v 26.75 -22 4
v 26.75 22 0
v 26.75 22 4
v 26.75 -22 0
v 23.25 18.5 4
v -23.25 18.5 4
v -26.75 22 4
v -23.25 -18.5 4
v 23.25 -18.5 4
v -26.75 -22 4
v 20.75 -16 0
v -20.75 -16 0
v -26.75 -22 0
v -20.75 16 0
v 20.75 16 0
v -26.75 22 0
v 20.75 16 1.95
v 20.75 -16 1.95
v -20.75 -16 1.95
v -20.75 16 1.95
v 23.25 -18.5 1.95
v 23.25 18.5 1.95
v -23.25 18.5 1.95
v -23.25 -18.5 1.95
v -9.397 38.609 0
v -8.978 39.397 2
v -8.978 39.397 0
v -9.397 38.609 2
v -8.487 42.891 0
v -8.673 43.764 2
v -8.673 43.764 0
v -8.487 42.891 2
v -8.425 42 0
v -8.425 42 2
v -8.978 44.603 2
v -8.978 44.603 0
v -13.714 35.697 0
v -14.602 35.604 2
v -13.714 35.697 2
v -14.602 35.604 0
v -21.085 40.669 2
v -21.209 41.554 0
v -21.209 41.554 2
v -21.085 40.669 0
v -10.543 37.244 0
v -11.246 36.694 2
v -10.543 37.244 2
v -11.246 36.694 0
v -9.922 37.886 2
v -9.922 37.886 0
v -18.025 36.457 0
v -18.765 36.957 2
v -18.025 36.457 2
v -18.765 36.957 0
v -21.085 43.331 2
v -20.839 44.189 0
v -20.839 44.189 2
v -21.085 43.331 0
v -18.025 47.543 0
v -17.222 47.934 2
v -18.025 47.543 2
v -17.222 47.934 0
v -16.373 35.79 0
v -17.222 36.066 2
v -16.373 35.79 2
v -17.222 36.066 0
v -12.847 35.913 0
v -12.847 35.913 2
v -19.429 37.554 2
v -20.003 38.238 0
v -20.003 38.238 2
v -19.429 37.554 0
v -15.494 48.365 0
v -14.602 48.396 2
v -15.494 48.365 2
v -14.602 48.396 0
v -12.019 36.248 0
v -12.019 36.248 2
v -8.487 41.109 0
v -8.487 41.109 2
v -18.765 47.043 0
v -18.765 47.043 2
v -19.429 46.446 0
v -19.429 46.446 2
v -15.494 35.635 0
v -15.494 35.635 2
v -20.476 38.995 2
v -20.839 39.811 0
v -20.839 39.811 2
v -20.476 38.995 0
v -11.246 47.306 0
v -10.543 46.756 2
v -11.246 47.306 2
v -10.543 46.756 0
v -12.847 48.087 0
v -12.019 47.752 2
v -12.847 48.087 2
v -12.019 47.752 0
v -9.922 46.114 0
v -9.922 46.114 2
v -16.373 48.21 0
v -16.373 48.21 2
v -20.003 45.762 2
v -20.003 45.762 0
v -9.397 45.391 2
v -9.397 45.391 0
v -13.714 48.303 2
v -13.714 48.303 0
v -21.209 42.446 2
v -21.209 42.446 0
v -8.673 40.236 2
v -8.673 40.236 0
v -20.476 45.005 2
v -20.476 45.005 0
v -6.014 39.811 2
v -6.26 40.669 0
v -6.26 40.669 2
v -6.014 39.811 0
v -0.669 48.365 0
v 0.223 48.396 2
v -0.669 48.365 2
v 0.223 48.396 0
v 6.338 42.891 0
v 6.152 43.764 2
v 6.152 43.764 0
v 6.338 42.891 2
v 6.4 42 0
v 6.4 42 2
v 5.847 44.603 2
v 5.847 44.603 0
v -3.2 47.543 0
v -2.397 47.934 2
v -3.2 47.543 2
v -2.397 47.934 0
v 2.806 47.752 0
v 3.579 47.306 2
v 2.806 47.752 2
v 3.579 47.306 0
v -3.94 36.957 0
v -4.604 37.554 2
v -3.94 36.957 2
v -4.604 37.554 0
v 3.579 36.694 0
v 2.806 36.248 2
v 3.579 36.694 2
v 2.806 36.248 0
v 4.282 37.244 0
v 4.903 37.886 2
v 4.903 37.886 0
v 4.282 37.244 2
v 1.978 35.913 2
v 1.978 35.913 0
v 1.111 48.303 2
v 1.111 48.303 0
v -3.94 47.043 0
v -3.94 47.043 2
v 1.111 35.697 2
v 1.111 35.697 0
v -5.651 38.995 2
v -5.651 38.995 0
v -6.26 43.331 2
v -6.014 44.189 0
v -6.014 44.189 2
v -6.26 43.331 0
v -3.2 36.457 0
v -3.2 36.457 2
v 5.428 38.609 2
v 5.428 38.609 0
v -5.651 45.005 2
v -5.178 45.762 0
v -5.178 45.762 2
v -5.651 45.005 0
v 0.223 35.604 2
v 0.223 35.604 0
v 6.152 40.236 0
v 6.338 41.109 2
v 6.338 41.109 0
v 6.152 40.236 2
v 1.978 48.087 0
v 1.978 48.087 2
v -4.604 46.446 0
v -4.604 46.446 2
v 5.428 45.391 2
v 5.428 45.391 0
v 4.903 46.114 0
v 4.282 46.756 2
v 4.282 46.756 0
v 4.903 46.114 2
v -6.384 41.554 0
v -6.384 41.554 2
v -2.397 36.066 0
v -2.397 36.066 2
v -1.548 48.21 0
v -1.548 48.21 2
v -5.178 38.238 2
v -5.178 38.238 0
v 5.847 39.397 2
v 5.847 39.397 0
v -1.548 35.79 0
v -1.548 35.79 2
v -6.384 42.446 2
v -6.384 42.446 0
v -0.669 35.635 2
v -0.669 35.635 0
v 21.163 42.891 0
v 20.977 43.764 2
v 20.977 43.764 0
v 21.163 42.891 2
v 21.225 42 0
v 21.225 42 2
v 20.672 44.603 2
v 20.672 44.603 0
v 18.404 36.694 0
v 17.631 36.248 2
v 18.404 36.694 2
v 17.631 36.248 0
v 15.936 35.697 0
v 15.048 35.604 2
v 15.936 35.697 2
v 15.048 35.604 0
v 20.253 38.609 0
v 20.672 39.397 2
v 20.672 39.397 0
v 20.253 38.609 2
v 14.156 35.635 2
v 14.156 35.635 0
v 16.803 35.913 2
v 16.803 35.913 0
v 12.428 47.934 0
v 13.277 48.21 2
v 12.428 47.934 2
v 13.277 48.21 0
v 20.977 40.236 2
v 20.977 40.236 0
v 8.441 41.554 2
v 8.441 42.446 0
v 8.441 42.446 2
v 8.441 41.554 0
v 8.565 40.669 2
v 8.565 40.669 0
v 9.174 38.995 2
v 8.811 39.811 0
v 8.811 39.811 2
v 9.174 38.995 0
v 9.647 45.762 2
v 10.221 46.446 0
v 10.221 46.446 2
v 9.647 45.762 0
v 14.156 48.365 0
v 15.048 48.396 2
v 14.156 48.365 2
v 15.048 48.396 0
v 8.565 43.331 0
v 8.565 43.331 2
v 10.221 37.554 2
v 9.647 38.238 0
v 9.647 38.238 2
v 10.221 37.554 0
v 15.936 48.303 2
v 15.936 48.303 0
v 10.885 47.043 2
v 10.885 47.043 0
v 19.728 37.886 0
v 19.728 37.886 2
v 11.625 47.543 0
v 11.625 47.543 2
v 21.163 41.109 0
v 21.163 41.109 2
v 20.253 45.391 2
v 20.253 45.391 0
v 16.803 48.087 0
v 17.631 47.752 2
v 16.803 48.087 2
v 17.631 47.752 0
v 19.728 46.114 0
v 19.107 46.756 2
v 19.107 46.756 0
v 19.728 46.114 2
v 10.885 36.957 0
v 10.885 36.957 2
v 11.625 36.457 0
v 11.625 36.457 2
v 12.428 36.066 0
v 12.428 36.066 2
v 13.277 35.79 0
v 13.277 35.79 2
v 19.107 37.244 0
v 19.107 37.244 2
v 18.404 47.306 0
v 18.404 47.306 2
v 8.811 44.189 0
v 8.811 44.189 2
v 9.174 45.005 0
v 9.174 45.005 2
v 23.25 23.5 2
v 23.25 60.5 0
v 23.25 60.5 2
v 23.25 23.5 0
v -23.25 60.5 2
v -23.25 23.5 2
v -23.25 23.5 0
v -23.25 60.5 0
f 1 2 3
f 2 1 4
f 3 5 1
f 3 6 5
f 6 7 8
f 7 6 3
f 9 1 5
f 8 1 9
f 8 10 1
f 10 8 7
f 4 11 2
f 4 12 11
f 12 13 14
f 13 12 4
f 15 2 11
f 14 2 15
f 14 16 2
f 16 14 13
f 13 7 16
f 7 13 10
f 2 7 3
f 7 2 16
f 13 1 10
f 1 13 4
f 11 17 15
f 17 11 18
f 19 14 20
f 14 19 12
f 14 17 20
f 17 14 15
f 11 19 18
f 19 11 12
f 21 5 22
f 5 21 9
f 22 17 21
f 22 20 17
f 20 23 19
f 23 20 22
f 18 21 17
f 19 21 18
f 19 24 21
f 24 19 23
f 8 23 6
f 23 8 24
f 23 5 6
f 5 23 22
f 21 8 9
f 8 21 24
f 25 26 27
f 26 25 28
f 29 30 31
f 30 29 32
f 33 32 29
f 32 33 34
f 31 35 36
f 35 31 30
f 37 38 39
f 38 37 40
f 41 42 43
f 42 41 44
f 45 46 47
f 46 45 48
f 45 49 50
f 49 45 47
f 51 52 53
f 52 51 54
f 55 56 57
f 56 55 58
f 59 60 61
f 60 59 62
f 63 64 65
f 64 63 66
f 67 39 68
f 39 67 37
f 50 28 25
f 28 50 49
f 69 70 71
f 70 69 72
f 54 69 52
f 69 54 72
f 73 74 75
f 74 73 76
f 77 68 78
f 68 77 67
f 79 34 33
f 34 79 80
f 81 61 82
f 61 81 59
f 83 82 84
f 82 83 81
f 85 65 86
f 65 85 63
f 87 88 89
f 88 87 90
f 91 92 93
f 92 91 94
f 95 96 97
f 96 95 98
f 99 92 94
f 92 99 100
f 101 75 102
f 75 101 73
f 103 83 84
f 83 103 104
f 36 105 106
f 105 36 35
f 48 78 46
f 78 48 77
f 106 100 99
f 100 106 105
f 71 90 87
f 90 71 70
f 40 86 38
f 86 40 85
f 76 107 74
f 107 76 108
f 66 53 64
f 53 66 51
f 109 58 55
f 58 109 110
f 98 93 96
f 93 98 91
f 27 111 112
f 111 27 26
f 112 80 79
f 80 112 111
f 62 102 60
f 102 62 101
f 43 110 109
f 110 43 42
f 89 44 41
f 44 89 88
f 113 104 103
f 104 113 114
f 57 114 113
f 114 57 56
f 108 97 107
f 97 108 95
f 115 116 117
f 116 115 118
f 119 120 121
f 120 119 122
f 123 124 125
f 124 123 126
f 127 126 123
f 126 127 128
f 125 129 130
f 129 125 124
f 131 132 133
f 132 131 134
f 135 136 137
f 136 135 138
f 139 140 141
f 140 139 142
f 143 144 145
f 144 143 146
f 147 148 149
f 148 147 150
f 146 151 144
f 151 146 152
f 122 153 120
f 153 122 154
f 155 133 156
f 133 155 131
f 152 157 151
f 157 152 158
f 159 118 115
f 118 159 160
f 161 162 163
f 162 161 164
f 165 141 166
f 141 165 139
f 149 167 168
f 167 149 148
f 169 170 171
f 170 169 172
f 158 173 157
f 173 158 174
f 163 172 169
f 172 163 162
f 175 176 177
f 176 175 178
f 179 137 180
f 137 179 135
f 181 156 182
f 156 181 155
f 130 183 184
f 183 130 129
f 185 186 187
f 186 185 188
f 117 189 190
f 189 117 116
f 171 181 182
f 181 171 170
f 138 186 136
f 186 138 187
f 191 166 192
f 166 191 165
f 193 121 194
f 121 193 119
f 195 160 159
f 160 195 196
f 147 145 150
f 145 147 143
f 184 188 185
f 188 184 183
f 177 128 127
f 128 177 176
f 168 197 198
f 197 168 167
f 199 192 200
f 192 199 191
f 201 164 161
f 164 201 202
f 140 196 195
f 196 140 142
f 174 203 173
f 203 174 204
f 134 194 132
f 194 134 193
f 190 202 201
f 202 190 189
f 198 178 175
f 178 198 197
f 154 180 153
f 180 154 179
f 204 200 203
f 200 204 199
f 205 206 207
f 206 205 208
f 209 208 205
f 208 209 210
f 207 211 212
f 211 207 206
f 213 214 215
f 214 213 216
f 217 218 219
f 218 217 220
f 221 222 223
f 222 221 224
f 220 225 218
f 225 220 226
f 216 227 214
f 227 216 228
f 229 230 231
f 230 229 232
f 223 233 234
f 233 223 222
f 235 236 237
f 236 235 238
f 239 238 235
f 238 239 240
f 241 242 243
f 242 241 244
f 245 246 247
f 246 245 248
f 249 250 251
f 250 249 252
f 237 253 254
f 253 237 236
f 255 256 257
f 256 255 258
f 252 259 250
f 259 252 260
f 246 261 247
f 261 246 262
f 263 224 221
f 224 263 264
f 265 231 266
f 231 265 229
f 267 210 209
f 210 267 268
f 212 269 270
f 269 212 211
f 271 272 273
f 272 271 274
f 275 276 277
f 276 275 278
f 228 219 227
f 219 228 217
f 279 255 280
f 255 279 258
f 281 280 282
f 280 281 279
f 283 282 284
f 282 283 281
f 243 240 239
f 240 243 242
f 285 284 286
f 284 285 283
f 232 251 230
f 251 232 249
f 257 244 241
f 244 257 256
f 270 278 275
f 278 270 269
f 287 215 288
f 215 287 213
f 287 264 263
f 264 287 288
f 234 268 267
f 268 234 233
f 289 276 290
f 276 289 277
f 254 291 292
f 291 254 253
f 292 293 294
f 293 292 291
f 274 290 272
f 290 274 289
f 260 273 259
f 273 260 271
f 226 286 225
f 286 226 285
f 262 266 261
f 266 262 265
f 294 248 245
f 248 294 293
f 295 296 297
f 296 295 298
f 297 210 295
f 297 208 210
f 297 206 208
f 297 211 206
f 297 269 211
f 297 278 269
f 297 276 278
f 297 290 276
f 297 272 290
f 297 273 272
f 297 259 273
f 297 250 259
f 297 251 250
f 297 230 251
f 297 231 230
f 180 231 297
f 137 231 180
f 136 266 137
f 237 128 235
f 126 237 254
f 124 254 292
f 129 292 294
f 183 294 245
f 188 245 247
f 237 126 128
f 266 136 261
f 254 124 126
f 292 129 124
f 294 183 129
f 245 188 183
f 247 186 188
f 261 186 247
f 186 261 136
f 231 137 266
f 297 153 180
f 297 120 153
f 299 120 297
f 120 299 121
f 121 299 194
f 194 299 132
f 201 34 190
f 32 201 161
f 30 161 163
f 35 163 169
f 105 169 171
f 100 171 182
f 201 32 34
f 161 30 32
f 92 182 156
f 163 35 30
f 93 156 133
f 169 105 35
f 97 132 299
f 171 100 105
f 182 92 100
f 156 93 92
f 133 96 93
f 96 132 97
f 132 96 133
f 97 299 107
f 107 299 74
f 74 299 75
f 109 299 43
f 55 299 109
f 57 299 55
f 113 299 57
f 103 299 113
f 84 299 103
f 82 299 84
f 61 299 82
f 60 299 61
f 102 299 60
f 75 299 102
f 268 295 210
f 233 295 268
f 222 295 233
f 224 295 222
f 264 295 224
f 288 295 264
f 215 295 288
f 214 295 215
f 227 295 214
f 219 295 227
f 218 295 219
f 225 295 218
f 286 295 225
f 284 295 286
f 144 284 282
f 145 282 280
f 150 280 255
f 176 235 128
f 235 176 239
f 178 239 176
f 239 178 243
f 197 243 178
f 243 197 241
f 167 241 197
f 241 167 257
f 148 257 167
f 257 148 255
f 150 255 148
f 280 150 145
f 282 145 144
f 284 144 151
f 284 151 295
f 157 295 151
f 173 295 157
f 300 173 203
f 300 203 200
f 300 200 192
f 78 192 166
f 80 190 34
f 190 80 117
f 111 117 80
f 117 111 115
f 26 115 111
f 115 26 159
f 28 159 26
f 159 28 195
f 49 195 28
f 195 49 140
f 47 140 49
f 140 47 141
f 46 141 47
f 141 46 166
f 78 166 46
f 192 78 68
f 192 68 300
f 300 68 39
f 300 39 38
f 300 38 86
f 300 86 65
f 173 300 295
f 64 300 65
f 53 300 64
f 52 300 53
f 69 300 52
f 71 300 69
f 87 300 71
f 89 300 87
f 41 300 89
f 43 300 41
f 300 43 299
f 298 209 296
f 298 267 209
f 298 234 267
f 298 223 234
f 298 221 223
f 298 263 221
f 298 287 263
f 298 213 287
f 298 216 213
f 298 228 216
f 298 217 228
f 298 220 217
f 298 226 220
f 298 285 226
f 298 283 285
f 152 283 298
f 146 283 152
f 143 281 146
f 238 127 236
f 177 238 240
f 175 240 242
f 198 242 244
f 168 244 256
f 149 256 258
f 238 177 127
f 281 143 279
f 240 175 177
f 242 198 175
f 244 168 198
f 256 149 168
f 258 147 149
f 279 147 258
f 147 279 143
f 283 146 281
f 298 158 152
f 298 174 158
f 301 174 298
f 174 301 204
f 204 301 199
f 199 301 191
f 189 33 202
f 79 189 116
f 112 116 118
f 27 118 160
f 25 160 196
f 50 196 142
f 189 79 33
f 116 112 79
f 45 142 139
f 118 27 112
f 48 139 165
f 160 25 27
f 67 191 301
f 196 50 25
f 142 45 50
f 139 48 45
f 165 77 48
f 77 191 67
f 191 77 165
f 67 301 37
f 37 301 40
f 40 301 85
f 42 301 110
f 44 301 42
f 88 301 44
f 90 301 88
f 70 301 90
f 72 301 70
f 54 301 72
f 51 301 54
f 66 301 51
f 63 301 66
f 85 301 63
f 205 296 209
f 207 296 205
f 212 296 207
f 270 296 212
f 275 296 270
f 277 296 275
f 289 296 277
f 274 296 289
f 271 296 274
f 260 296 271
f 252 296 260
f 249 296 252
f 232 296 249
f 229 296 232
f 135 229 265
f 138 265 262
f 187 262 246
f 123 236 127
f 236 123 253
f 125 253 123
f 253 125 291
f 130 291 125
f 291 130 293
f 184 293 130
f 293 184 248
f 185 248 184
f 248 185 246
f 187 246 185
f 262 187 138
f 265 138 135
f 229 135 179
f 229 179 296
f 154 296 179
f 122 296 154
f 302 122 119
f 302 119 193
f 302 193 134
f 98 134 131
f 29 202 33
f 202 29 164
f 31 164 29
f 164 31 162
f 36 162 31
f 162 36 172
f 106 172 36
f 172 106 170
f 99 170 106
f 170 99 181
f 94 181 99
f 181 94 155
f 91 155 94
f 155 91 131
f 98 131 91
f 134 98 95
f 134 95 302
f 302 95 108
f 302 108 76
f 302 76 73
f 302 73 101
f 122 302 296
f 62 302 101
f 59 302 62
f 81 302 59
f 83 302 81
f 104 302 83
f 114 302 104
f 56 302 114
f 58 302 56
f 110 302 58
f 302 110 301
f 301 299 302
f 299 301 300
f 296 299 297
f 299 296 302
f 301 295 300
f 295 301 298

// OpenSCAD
// [FL_INDEX: keywords="openscad, 3d_parametric, Customizable_Fridge_Magnet_Picture_Frame, csg_solid" | COT="Parametric OpenSCAD design from 3DCodeverse"]
// Title: Customizable Fridge Magnet Picture Frame

// Title: Picture Frame
// Author: http://www.thingiverse.com/Jinja
// Date: 28/9/2013

/////////// START OF PARAMETERS /////////////////

// The height of the picture
height = 45.5;

// The width of the picture
width = 36;

// The width of the frame border
border = 6;

// How much the border overlaps the edge of the picture
overlap = 2;

// How thick the frame is in total
thickness = 4;

// How thick the backing is
back_thickness = 2;

// The diameter of the magnet holes, 0 if you don't want holes. Even if you're not adding magnets, adding holes uses less plastic.
magnet_diameter = 12.8;

// whether or not to include a stand
stand = "NoStand"; //[ Stand, NoStand ]

// calibration, how many 10ths of a millimeter to adjust the backing size so it is a snug fit in the frame. Increase if it's too loose, decrease if it's too tight. Once you've found the right value for your printer you should be able to print frames of any size. Experiment with small frames first.
calibration = 0; //[-10:10]

// What to include on the plate
plate = "Both"; //[ Back, Front, Both ]


/////////// END OF PARAMETERS /////////////////
rounded = 0.7*1;
overhang=45*1;

adjust = calibration/10;

$fs=0.3*1;
//$fa=5*1; //smooth
$fa=8*1; //nearly smooth
//$fa=20*1; //rough


if( ( plate == "Front" ) || ( plate == "Both" ) )
{
	front( height, width, border, overlap, thickness, back_thickness, stand );
}

if( ( plate == "Back" ) || ( plate == "Both" ) )
{
	translate([0, width+border ,back_thickness*0.5])
	back( height+adjust+1, width+adjust+1, back_thickness, magnet_diameter);
}

module front( height, width, border, overlap, thickness, back_thickness, stand )
{
	difference()
	{
		translate([0,0,thickness*0.5])
		frame( height, width, border, overlap, thickness );
		translate([0,0,thickness-(0.5*back_thickness)])
		back( height+1, width+1, back_thickness*1.05 );
	}
	y = (height*0.7)*cos(75);
	x = y*cos(75);
	s = border-overlap-0.5;
	if( stand=="Stand" )
	{
		translate([height*0.5+s+0.5,0,thickness])
		hull()
		{
			translate([-s*0.5,0,0])
			cube([s,s,0.01], true);
			translate([-1-x,0,y])
			rotate([90,0,0])
			cylinder(s,1,1,true);
		}
	}
}


module back( height, width, back, diam )
{
	gap = 1;
	hremaining = (((height-diam)/2)-gap); 
	hnum=floor( hremaining/(diam+gap) );
	hspacing=((hremaining-((diam+gap)*hnum))/(hnum+1))+diam+gap;
	wremaining = (((width-diam)/2)-gap); 
	wnum=floor( wremaining/(diam+gap) );
	wspacing=((wremaining-((diam+gap)*wnum))/(wnum+1))+diam+gap;
	difference()
	{
		cube( [ height, width, back ], true );
		if( diam > 0 )
		{
			translate([0,0,-back])
			for(i=[-hnum:1:hnum])
			{
				for(j=[-wnum:1:wnum])
				{
					translate([i*hspacing,j*wspacing,0])
					cylinder( back*2, diam*0.5, diam*0.5 );
				}
			}
		}
	}
}

module frame( height, width, border, overlap, back )
{
	difference()
	{
		cube( [ height+2*(border-overlap), width+2*(border-overlap), back ], true );
		translate([0,0,-1])
		cube( [ height+2*(-overlap), width+2*(-overlap), back+2 ], true );
	}
}

module cutter(dist, overhang)
{
	size = dist*2;

	translate([dist,-dist,-dist])
	cube([size,size,size]);

	translate([-dist-size,-dist,-dist])
	cube([size,size,size]);

	translate([dist,-dist,0])
	rotate([0,-overhang,0])
	cube([size,size,size]);

	translate([-dist,-dist,0])
	rotate([0,-90+overhang,0])
	cube([size,size,size]);

	translate([dist,-dist,0])
	rotate([0,90+overhang,0])
	cube([size,size,size]);

	translate([-dist,-dist,0])
	rotate([0,180-overhang,0])
	cube([size,size,size]);

}

module diamond( rounded )
{
	dist = rounded;
	difference()
	{
		cube([2*rounded,2*rounded,2*rounded], true);
		for(i=[0:45:179])
		{
			rotate([0,0,i])
			cutter(dist, overhang);
		}
	}
}
